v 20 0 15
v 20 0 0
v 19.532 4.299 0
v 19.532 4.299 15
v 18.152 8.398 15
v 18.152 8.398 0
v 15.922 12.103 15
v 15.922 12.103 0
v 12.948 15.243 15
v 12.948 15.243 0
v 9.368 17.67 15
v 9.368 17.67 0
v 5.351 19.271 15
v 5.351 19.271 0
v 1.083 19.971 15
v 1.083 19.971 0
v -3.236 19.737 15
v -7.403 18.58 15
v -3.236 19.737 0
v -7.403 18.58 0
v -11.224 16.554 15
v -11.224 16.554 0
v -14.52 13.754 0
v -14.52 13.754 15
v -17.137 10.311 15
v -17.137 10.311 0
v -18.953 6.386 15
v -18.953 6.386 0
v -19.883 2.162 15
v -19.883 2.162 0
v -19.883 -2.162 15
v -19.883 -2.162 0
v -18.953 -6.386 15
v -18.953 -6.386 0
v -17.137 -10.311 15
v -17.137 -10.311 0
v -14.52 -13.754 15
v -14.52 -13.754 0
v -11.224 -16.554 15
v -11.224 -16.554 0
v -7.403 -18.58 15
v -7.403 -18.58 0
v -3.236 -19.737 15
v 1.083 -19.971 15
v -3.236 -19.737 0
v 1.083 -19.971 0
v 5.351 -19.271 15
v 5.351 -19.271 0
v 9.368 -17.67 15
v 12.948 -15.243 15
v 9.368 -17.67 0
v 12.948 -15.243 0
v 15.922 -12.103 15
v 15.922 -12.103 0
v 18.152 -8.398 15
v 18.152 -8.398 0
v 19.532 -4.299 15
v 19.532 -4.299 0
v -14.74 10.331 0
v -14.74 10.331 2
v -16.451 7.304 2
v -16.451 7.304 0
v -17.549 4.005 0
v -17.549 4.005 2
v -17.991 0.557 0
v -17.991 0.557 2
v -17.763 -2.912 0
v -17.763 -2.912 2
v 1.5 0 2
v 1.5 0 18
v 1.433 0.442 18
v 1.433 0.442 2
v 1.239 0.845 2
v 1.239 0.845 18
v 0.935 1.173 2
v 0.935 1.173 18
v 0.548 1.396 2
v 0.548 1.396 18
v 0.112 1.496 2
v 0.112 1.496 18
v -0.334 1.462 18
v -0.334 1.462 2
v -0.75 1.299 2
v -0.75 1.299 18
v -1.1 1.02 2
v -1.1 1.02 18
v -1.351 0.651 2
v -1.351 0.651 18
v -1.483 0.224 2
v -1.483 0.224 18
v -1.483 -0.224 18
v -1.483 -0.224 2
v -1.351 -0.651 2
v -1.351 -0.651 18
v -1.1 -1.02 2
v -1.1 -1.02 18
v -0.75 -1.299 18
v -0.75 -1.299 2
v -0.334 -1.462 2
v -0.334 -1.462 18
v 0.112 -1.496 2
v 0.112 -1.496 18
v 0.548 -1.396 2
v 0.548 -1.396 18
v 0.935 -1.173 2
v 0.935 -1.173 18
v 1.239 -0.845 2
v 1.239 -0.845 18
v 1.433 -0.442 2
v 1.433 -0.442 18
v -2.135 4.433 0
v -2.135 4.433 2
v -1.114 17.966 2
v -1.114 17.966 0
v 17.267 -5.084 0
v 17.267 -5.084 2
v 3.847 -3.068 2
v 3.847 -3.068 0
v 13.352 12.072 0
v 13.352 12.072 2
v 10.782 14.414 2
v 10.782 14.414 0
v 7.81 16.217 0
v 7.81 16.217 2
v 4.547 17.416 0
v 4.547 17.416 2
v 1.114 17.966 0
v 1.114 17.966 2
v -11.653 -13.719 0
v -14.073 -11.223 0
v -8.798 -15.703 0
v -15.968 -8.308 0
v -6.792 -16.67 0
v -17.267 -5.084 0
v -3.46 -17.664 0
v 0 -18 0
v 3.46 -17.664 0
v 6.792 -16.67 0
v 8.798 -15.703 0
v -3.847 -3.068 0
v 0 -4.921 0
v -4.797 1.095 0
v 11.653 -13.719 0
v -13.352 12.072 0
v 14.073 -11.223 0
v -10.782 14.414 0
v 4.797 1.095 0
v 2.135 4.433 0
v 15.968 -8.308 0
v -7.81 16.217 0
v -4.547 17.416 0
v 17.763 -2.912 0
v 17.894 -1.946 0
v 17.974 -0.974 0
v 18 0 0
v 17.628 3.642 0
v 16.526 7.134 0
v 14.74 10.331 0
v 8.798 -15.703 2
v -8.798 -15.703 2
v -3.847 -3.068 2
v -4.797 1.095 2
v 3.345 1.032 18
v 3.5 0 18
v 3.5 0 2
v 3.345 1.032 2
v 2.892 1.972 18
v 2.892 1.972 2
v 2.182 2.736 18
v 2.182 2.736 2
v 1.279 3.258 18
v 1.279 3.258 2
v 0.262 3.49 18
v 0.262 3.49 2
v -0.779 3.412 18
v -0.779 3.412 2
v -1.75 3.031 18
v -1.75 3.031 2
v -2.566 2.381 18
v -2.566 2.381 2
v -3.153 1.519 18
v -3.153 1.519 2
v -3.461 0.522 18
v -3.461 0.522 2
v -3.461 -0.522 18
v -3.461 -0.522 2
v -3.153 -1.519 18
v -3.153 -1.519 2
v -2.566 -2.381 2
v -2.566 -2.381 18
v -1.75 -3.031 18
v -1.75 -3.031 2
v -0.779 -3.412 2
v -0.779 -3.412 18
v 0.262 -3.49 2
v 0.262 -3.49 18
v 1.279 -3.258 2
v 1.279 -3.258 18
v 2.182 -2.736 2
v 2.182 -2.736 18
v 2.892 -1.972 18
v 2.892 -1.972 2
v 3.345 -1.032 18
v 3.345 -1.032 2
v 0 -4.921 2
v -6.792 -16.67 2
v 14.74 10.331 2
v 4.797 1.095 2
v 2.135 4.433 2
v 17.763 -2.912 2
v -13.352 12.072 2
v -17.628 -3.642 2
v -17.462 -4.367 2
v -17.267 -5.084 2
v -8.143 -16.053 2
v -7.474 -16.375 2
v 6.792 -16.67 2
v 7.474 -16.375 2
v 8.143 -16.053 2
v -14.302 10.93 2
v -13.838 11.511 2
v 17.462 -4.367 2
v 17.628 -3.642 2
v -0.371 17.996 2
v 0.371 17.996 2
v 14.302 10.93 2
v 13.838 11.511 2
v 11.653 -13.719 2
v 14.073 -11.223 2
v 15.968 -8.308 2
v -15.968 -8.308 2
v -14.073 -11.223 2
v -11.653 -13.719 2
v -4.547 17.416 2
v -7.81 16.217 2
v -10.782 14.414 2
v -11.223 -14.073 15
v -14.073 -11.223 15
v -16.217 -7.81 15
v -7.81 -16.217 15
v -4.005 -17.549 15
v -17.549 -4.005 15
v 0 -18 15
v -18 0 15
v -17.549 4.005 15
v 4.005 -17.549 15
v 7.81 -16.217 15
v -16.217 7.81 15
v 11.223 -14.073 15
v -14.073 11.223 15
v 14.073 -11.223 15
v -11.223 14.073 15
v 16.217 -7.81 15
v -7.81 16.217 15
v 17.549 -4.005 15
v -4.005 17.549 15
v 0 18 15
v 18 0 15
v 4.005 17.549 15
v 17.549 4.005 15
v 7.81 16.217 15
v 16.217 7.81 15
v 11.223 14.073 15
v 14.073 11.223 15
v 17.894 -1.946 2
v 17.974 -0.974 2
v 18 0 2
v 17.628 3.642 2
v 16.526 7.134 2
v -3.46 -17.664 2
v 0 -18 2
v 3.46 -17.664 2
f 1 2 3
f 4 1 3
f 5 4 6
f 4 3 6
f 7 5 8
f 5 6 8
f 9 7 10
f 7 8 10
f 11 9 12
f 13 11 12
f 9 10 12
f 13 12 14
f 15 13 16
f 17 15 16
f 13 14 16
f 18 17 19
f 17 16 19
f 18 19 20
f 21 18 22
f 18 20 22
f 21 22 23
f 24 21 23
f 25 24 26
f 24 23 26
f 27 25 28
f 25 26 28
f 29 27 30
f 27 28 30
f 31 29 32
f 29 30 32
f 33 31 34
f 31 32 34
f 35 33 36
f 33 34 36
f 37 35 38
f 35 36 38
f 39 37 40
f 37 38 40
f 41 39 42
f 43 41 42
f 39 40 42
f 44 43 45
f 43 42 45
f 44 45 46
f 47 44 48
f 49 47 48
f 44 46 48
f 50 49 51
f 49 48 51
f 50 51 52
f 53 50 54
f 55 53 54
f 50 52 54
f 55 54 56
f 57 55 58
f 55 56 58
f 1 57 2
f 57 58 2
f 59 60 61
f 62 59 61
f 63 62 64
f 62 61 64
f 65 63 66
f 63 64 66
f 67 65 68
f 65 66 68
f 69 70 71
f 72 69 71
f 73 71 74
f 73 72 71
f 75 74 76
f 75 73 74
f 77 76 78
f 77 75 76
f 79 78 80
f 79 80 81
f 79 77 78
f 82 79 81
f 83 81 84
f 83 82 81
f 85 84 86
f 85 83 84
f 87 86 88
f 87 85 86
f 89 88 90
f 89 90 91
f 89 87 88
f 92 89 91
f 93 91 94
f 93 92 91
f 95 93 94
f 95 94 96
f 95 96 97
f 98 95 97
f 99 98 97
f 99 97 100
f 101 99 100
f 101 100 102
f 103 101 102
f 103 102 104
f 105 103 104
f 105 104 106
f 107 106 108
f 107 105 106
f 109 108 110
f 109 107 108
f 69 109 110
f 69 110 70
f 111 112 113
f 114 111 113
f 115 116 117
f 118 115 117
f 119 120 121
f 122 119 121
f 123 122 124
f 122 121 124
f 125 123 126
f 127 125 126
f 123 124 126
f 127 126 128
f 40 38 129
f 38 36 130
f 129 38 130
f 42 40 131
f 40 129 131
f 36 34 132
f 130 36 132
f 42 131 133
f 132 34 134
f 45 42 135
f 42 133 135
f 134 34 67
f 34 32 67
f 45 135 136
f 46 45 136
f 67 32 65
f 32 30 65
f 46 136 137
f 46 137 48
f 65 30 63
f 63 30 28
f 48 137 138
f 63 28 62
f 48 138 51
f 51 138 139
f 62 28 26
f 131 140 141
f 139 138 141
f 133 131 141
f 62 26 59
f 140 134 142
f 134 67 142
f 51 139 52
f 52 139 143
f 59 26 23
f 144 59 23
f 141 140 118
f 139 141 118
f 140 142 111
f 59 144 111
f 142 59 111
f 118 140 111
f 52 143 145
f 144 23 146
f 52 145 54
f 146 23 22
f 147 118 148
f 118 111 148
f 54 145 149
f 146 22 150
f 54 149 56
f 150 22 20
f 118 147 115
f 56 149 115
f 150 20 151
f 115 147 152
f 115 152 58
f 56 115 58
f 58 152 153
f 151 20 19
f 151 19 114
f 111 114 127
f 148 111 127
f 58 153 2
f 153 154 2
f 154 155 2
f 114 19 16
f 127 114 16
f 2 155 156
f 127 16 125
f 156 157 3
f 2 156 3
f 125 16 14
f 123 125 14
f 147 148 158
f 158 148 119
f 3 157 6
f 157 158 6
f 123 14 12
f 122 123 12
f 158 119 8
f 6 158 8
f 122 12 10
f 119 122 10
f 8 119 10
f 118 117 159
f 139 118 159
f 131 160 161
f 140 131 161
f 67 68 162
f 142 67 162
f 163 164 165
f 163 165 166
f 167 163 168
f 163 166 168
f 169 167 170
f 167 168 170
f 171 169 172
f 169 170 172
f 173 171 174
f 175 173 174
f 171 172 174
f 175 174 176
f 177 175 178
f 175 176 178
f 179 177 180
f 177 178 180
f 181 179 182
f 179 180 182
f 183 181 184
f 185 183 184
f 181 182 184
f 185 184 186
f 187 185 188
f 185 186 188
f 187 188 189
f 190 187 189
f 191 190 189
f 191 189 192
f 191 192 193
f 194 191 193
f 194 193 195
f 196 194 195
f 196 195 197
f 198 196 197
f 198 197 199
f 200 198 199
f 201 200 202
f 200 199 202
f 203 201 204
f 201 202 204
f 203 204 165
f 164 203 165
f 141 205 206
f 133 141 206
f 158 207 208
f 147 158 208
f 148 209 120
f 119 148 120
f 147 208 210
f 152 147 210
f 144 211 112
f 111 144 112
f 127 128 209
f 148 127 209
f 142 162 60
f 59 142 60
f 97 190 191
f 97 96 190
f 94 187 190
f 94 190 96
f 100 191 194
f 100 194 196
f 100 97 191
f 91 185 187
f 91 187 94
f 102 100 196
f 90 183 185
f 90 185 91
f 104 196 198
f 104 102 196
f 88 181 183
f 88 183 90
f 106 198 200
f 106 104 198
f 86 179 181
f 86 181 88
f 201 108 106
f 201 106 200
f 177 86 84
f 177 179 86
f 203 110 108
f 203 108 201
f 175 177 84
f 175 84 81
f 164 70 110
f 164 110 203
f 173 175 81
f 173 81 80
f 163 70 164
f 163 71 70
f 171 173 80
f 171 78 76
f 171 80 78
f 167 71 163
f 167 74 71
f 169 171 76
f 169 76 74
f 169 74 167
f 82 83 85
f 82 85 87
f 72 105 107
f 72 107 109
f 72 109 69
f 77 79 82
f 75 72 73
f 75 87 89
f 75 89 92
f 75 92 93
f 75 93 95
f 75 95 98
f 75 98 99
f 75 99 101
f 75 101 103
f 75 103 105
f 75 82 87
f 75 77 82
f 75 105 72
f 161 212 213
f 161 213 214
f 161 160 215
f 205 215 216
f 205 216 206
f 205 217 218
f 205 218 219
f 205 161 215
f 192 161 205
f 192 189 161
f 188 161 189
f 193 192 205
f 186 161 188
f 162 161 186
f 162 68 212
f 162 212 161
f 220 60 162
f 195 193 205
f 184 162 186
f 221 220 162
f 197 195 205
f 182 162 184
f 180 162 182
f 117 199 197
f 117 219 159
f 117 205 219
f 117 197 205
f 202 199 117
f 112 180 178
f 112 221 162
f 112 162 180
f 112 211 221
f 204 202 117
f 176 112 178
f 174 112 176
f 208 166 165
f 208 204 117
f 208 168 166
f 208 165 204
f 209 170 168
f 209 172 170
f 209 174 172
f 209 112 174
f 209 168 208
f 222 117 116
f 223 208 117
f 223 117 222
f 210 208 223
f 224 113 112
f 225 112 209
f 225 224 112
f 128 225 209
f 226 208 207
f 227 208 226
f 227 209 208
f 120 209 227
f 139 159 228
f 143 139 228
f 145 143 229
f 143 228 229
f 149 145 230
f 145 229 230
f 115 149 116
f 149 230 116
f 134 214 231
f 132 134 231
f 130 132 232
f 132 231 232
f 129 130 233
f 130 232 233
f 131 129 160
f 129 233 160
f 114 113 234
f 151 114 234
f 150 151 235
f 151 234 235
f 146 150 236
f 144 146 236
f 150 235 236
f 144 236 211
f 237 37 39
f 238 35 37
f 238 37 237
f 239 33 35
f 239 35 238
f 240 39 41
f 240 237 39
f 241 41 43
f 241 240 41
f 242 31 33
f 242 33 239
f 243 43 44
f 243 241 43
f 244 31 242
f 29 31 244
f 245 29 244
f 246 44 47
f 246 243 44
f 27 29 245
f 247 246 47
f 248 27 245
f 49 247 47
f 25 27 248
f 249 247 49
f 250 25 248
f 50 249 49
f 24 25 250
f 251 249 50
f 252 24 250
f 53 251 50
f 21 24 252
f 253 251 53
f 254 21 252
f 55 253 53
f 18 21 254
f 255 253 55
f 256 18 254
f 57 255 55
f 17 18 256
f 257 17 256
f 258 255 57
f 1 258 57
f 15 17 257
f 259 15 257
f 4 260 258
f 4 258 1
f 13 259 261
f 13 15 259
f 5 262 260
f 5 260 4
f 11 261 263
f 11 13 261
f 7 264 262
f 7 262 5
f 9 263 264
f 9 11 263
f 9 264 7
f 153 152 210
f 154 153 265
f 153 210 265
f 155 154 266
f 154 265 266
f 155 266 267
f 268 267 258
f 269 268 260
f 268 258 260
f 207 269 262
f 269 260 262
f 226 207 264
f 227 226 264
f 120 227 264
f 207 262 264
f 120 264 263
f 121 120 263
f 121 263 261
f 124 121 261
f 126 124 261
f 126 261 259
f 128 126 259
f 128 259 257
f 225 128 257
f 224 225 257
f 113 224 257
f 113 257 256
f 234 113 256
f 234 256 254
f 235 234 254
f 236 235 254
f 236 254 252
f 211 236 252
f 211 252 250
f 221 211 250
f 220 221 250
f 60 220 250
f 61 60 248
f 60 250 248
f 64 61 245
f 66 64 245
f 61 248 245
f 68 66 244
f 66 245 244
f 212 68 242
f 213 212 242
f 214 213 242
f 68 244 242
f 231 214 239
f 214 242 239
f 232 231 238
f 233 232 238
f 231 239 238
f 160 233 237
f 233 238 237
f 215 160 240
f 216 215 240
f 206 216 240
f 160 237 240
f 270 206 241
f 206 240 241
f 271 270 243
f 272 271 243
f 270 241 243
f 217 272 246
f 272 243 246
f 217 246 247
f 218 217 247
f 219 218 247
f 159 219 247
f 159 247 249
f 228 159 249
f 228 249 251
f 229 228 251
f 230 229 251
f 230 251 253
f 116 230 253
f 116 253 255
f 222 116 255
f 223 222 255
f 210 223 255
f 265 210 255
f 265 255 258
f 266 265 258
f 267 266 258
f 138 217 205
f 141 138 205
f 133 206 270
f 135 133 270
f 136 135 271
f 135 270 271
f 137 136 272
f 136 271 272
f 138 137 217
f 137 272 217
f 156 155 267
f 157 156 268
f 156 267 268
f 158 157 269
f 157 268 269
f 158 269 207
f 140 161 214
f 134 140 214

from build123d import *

# Parameters (mm, degrees)
F0_R     = 20
F1_DEPTH = 15
F2_R     = 18
F3_DEPTH = 13
F5_R     = 3.5
F5_R_2   = 1.5
F6_DEPTH = 16
F8_DEPTH = 2


with BuildPart() as f1:
    # F0 (on Top) → F1 (new body)
    with BuildSketch(Plane.XY):
        Circle(F0_R)
    extrude(amount=F1_DEPTH)

    # F2 (on face) → F3 (cut)
    with BuildSketch(Plane.XY.offset(15)):
        Circle(F2_R)
    extrude(amount=-F3_DEPTH, mode=Mode.SUBTRACT)

    # F5 (on face) → F6 (join)
    with BuildSketch(Plane.XY.offset(2)):
        Circle(F5_R)
        Circle(F5_R_2, mode=Mode.SUBTRACT)
    extrude(amount=F6_DEPTH)

    # F7 (on face) → F8 (cut)
    with BuildSketch(Plane.XY.offset(2)):
        with BuildLine():
            Line((-3.8471836237, -3.068026562), (-17.26724866, -5.0835148974))
            ThreePointArc((-17.26724866, -5.0835148974), (-14.0729666844, -11.2228164335), (-8.7983848642, -15.7031342025))
            Line((-8.7983848642, -15.7031342025), (-3.8471836237, -3.068026562))
        make_face()
        with BuildLine():
            Line((0, -4.9207325491), (-6.7915014573, -16.6695983142))
            ThreePointArc((-6.7915014573, -16.6695983142), (0, -18), (6.7915014573, -16.6695983142))
            Line((6.7915014573, -16.6695983142), (0, -4.9207325491))
        make_face()
        with BuildLine():
            Line((-4.7973595105, 1.0949660026), (-14.7404054341, 10.3305589219))
            ThreePointArc((-14.7404054341, 10.3305589219), (-17.5487024193, 4.0053768112), (-17.7629079286, -2.9118897508))
            Line((-17.7629079286, -2.9118897508), (-4.7973595105, 1.0949660026))
        make_face()
        with BuildLine():
            Line((-2.1350258376, 4.433426834), (-1.1137362668, 17.965511168))
            ThreePointArc((-1.1137362668, 17.965511168), (-7.8099073041, 16.2174396222), (-13.3515990255, 12.072067075))
            Line((-13.3515990255, 12.072067075), (-2.1350258376, 4.433426834))
        make_face()
        with BuildLine():
            ThreePointArc((13.3515990255, 12.072067075), (7.8099073041, 16.2174396222), (1.1137362668, 17.965511168))
            Line((1.1137362668, 17.965511168), (2.1350258376, 4.433426834))
            Line((2.1350258376, 4.433426834), (13.3515990255, 12.072067075))
        make_face()
        with BuildLine():
            ThreePointArc((18, 0), (17.1657696858, 5.4163041913), (14.7404054341, 10.3305589219))
            Line((14.7404054341, 10.3305589219), (4.7973595105, 1.0949660026))
            Line((4.7973595105, 1.0949660026), (17.7629079286, -2.9118897508))
            ThreePointArc((17.7629079286, -2.9118897508), (17.940629068, -1.4607630344), (18, 0))
        make_face()
        with BuildLine():
            ThreePointArc((8.7983848642, -15.7031342025), (14.0729666844, -11.2228164335), (17.26724866, -5.0835148974))
            Line((17.26724866, -5.0835148974), (3.8471836237, -3.068026562))
            Line((3.8471836237, -3.068026562), (8.7983848642, -15.7031342025))
        make_face()
    extrude(amount=-F8_DEPTH, mode=Mode.SUBTRACT)


solid = f1.part
